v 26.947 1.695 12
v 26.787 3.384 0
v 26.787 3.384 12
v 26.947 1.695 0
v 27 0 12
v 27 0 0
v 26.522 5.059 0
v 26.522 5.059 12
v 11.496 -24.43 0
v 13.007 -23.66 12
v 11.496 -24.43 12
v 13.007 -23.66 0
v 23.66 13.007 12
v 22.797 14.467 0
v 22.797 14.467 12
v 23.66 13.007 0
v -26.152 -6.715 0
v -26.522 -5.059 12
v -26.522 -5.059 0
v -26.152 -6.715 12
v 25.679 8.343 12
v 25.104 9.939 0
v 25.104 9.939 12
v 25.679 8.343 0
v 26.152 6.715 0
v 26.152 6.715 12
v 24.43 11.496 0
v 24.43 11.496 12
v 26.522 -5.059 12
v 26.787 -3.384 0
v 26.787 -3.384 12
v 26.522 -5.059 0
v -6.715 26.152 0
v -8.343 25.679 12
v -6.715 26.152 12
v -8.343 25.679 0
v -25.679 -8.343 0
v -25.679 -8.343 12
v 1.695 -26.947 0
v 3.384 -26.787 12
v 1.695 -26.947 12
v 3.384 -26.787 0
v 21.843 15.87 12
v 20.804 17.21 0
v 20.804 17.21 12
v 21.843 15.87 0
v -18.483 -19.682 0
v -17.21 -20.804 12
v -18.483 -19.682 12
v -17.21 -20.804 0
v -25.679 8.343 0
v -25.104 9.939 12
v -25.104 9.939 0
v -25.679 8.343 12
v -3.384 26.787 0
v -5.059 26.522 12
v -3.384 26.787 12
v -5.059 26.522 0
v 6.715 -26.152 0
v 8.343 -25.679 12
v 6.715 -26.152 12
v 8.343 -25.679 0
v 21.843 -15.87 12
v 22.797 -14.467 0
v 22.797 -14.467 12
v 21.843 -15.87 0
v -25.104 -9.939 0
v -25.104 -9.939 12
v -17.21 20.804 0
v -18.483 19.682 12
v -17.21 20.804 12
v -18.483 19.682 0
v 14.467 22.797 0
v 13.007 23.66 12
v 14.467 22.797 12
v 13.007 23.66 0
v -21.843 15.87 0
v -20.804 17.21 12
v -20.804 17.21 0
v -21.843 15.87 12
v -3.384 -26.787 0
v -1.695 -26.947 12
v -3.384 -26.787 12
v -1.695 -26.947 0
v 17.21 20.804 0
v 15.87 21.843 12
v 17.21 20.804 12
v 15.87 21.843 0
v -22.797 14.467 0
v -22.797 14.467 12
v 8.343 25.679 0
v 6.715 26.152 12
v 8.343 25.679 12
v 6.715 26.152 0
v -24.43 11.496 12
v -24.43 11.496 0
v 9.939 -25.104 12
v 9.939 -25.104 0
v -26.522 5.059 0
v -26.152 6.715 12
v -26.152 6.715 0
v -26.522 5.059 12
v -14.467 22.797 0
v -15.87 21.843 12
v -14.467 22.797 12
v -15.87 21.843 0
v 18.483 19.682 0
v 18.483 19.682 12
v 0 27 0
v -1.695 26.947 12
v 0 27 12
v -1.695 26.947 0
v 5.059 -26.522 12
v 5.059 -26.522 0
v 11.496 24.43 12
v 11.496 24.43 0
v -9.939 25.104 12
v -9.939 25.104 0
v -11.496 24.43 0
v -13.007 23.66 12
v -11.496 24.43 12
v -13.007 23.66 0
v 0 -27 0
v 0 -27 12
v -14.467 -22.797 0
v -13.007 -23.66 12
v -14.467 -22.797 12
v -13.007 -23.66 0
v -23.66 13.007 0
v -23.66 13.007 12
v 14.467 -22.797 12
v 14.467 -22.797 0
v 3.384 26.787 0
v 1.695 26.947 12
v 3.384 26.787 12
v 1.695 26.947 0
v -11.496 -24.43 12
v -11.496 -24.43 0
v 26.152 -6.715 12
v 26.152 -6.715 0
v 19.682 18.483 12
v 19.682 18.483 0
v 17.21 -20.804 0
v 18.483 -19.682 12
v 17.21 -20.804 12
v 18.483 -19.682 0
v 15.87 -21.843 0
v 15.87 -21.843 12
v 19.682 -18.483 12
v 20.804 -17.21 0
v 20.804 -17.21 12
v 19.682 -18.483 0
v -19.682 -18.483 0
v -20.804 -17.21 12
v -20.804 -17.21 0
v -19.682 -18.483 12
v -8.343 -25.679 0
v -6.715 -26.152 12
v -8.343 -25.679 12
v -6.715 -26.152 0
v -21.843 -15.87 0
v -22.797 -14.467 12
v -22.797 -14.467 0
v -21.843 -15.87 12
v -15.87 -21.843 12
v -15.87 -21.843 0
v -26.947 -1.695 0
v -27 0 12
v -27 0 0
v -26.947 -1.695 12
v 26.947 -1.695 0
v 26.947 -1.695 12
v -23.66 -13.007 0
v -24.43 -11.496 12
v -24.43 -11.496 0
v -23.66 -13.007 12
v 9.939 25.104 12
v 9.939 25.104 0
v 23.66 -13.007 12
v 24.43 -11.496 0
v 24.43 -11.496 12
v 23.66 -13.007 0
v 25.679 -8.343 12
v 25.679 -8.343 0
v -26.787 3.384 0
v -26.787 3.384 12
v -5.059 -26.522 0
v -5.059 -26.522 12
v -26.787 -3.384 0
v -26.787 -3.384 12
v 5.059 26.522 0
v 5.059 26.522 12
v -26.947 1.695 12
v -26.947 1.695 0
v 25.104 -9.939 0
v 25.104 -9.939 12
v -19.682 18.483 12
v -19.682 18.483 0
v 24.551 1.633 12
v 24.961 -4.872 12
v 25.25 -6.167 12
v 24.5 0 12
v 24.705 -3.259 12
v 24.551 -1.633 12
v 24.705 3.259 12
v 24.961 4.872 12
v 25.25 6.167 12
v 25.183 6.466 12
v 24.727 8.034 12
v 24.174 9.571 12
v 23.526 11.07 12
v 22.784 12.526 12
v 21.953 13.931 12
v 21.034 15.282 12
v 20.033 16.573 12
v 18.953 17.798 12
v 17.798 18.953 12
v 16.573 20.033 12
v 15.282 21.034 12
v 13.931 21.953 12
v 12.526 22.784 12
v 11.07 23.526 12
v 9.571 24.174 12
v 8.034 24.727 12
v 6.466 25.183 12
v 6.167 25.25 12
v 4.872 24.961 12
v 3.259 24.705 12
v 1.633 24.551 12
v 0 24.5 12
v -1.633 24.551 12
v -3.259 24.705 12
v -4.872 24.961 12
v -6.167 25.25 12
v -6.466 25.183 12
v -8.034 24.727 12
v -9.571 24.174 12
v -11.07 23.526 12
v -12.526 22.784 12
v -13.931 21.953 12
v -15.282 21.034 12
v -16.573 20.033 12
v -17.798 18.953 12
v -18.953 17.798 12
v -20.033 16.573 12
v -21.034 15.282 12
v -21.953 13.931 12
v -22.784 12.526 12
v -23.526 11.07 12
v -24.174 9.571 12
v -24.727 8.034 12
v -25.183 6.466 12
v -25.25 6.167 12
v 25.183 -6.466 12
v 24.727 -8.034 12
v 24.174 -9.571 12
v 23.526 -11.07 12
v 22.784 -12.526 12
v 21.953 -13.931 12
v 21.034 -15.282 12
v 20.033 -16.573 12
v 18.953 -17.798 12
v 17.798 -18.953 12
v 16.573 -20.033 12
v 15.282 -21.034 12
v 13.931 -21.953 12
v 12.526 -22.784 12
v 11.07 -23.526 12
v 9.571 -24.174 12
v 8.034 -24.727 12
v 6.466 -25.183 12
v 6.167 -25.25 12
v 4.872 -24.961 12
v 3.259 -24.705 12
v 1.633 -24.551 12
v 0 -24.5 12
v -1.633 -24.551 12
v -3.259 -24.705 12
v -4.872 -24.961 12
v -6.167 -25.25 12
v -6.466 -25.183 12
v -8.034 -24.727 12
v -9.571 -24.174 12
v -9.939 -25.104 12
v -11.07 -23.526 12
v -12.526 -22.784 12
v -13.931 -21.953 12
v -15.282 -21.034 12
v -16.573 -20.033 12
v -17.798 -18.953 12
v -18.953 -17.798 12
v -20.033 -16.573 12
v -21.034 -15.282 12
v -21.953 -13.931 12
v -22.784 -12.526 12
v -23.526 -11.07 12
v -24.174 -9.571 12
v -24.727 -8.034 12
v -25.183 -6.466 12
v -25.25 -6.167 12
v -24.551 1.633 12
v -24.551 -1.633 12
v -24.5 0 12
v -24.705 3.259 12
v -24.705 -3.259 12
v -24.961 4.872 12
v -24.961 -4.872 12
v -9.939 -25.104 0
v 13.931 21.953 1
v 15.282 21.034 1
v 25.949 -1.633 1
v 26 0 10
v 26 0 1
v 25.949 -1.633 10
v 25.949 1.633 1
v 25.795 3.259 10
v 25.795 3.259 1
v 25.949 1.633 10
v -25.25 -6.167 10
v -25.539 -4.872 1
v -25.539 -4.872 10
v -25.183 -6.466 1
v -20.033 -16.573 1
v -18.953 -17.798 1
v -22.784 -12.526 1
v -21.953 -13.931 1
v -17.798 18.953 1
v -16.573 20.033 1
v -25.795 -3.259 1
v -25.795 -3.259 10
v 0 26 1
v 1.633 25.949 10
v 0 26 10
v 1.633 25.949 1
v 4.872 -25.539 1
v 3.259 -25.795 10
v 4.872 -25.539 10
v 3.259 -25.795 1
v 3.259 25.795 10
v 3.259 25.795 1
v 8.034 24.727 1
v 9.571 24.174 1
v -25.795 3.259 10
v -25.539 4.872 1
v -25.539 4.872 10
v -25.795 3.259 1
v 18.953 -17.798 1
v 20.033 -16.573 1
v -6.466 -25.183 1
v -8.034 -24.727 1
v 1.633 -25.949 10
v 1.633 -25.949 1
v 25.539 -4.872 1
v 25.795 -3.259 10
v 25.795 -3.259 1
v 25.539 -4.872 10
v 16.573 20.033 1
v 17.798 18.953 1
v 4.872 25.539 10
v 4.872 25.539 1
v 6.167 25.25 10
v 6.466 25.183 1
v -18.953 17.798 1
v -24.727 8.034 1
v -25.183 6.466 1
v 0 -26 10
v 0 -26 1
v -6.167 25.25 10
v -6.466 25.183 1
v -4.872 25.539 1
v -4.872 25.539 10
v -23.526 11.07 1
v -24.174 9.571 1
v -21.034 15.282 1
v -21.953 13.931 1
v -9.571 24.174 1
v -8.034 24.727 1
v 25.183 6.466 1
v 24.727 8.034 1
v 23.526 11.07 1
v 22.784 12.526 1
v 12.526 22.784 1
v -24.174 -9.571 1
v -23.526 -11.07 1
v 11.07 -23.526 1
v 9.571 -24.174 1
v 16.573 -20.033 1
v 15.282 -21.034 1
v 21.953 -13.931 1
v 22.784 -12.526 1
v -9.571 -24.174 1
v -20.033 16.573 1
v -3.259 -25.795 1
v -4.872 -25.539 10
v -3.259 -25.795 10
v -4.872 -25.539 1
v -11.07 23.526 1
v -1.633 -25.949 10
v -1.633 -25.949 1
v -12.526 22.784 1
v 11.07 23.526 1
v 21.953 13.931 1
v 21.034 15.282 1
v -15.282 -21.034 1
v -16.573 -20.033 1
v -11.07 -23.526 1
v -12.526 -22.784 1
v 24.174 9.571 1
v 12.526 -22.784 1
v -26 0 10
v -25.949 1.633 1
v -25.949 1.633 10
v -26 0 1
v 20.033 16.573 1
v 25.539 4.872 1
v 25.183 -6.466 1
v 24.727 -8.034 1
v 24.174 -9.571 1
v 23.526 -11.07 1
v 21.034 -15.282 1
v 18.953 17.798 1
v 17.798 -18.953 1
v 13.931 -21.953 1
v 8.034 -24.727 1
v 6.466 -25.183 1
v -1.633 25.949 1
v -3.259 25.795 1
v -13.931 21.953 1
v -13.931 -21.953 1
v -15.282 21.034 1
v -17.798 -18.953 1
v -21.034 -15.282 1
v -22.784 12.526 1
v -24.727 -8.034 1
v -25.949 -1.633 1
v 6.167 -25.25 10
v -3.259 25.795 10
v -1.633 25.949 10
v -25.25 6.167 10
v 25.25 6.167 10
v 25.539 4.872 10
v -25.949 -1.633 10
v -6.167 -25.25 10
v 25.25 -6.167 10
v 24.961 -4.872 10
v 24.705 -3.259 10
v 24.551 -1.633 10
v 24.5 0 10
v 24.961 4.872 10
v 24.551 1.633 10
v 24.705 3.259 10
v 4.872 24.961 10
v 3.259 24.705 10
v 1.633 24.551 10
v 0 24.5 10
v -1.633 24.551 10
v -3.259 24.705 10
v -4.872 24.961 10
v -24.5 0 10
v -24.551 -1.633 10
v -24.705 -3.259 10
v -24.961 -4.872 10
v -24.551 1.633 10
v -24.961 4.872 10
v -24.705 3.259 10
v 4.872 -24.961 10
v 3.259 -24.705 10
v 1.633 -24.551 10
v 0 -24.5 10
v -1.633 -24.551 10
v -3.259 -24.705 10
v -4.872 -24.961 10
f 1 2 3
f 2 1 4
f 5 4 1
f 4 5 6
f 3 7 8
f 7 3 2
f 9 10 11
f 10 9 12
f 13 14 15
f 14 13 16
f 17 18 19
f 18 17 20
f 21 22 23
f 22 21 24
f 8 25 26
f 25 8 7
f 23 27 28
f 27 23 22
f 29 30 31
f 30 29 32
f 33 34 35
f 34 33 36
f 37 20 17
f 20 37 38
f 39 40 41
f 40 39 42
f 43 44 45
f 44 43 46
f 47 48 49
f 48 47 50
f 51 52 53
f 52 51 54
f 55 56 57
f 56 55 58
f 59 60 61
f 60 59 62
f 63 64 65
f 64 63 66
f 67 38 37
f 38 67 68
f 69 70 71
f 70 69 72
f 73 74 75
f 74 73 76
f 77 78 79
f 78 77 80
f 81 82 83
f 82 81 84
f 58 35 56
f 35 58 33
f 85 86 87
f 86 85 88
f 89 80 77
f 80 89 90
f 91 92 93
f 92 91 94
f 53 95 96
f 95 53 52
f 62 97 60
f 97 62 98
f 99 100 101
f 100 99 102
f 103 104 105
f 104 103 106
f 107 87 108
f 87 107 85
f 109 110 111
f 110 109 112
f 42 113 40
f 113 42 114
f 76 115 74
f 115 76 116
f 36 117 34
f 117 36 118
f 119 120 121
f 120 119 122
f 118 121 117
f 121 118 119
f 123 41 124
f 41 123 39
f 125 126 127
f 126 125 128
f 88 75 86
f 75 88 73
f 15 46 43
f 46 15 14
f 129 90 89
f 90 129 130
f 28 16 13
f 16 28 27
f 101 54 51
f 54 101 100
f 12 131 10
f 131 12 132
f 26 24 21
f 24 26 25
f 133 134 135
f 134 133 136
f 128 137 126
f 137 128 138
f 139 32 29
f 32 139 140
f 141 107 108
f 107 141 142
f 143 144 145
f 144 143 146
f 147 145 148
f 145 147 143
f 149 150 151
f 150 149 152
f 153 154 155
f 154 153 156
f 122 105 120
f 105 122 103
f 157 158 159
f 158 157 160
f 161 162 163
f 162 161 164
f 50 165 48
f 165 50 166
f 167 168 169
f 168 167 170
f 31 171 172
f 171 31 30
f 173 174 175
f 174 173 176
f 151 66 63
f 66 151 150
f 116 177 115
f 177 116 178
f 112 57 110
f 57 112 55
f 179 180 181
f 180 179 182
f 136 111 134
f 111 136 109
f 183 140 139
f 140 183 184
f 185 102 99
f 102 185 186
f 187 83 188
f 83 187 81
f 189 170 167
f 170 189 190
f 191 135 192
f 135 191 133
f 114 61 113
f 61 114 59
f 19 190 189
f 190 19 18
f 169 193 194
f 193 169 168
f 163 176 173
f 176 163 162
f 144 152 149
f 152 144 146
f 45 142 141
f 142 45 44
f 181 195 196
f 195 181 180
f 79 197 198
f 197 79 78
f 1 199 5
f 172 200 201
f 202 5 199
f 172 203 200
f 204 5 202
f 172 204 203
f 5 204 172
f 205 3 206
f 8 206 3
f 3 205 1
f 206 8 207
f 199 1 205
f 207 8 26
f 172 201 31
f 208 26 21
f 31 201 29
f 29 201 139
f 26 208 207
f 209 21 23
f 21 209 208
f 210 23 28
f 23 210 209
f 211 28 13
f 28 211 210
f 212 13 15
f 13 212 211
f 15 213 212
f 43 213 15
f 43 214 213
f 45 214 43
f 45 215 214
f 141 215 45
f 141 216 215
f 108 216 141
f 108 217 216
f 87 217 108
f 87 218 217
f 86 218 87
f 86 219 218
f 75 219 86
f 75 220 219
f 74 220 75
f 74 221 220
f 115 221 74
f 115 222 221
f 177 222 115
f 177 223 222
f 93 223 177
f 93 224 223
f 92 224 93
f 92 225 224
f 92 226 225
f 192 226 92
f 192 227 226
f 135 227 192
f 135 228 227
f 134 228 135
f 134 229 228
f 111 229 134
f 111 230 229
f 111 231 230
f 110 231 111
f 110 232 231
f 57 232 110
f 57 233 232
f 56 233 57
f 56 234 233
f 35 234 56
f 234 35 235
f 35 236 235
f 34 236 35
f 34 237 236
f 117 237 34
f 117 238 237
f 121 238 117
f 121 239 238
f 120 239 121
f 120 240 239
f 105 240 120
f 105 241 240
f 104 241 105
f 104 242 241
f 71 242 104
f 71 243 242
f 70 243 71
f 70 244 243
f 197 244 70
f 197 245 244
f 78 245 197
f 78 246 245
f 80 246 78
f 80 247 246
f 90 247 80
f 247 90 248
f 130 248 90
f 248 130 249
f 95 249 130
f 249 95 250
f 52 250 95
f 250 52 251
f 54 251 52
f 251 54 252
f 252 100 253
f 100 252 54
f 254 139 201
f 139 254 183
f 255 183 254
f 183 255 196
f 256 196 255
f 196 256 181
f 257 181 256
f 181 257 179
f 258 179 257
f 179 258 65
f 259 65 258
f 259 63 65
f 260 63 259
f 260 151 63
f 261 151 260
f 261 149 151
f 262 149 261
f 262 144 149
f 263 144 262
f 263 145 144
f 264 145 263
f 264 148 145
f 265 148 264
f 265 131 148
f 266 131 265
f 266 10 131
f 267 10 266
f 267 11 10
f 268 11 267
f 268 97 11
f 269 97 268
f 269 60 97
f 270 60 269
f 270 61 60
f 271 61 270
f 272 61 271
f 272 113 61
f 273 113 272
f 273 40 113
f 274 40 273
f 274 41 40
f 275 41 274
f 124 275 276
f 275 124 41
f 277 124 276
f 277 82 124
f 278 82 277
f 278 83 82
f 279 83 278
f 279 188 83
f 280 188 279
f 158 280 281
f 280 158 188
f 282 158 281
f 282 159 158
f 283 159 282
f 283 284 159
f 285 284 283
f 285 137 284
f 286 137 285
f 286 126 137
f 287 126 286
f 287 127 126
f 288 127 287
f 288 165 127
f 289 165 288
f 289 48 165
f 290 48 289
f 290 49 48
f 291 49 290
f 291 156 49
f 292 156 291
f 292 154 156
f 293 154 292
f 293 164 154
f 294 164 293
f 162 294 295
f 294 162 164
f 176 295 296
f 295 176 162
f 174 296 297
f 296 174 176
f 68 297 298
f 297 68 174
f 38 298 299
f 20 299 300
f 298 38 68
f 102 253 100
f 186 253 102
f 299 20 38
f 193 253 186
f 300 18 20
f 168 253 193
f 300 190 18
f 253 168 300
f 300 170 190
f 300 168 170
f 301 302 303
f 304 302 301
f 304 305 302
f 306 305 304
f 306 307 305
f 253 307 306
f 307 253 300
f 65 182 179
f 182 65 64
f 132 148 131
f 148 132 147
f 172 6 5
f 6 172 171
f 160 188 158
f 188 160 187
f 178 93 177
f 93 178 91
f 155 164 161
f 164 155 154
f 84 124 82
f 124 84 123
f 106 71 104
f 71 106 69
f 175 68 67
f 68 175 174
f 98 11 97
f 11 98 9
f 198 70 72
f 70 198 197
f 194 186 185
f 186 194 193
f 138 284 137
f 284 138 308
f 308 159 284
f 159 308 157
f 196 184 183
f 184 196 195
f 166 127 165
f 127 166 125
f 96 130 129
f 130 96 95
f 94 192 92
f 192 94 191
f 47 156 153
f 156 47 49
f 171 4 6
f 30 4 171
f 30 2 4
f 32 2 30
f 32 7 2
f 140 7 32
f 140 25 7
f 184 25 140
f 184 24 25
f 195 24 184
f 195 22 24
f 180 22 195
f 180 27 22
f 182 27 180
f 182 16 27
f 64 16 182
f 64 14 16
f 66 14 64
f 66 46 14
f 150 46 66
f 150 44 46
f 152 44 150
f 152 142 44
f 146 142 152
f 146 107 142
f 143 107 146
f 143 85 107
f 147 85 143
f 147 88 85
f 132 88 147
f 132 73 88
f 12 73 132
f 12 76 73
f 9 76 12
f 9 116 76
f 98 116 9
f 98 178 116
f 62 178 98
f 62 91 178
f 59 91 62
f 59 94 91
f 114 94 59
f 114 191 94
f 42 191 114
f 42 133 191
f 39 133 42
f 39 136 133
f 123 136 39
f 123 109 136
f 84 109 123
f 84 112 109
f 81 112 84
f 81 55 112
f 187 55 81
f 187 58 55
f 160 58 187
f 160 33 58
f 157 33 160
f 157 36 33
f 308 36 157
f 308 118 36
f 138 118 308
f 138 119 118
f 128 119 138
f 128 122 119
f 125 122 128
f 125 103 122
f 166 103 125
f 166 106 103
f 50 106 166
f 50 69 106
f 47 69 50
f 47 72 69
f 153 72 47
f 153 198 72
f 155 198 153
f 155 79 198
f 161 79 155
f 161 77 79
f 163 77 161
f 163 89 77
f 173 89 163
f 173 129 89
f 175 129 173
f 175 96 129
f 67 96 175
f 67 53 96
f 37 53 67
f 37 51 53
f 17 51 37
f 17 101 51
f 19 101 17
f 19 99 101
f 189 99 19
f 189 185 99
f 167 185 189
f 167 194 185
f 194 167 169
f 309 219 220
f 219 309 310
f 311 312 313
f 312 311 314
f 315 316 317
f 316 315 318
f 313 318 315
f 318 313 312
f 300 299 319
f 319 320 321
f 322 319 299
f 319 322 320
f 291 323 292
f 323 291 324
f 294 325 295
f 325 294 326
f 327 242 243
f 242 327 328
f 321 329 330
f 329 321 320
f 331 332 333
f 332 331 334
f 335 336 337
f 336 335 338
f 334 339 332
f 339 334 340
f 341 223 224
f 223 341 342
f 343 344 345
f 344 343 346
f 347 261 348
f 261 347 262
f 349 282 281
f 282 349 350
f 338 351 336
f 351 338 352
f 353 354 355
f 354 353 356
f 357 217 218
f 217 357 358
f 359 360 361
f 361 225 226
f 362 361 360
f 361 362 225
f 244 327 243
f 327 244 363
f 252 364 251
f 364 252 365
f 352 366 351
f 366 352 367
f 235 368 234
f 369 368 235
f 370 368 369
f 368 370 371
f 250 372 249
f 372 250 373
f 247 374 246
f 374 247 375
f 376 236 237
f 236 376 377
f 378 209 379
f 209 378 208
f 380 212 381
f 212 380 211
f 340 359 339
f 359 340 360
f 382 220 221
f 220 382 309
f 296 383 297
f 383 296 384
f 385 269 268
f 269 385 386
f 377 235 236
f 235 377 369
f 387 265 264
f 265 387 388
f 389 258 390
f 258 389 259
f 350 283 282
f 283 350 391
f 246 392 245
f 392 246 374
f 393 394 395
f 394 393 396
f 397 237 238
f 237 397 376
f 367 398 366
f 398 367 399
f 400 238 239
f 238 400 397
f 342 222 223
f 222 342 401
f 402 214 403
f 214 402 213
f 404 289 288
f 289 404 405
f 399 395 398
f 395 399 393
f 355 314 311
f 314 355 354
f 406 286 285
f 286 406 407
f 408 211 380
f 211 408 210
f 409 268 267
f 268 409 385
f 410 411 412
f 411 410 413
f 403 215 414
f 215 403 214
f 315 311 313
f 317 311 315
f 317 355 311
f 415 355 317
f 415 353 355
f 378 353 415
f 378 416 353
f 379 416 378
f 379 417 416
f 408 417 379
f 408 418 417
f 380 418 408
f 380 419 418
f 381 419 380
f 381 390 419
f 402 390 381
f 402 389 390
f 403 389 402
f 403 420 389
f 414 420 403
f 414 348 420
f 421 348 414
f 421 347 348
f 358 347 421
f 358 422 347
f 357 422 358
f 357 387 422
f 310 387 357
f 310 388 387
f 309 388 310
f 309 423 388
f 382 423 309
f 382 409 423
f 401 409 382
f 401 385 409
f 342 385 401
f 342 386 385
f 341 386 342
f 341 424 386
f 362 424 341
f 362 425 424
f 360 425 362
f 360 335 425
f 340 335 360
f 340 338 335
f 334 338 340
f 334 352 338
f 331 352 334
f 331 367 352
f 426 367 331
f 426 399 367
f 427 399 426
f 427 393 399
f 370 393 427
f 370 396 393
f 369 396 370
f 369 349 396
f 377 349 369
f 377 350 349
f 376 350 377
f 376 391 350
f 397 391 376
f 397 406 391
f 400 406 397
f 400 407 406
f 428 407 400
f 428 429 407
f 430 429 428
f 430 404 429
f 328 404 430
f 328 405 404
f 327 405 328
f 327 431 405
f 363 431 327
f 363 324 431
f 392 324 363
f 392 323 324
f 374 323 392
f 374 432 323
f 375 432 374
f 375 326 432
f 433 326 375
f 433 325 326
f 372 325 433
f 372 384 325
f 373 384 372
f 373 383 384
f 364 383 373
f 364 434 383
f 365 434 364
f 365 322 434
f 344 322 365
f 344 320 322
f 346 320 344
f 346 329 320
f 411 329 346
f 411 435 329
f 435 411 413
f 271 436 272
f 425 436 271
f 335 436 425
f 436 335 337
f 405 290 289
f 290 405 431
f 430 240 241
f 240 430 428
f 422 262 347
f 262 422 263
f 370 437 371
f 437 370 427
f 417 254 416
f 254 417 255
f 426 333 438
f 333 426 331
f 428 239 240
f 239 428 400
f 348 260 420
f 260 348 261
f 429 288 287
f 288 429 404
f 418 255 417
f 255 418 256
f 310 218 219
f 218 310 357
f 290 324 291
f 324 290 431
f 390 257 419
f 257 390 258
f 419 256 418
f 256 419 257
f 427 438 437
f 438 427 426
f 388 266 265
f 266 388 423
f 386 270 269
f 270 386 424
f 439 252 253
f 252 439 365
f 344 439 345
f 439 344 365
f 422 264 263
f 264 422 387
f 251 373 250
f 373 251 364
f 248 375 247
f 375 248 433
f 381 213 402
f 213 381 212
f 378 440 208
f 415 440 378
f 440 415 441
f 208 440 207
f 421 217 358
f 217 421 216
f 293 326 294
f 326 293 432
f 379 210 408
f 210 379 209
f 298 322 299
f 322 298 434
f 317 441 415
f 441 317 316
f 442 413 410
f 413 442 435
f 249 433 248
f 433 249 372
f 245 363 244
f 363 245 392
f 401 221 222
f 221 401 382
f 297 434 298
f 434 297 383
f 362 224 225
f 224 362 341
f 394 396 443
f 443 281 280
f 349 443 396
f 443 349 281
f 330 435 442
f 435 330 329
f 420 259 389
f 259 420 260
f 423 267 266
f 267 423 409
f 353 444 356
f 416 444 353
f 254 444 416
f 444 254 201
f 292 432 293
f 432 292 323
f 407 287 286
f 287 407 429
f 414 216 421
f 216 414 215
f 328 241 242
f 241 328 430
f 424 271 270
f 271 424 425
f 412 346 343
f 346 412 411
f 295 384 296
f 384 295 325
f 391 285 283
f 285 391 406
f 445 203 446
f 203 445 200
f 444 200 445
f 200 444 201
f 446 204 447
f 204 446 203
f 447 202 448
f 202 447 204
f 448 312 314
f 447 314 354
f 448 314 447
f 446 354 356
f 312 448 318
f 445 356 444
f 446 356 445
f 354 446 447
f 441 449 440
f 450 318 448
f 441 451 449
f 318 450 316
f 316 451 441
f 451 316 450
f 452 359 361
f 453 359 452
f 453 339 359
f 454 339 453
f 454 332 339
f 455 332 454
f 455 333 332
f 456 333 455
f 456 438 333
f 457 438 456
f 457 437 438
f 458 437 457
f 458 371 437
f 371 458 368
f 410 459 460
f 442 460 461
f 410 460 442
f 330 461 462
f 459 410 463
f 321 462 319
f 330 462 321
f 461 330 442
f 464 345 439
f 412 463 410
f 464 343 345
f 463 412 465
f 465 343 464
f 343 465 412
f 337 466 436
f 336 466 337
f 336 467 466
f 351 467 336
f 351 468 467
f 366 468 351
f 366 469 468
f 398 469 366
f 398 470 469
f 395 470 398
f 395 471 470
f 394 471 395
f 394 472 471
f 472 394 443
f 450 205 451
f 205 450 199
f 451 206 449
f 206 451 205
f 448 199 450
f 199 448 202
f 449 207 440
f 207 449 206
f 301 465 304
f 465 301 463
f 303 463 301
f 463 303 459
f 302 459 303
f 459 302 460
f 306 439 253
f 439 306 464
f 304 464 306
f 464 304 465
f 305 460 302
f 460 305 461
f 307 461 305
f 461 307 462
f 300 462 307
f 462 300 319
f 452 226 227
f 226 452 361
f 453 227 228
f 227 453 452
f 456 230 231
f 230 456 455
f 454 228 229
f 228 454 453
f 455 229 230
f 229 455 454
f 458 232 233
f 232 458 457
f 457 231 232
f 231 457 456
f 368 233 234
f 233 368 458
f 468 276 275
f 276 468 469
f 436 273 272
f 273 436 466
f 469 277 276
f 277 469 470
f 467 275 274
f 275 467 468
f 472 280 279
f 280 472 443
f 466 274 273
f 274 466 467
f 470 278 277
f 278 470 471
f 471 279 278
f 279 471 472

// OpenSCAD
$fn = 100;

inner_diameter = 52;
inner_height = 11;
wall = 1;
thread_depth = 1.5;

difference() {
  cylinder(inner_height + wall, d=inner_diameter + wall * 2);
  translate([0, 0, wall])
    cylinder(inner_height, d=inner_diameter);
}

module circles() {
  translate([inner_diameter - thread_depth, 0, inner_height - 1])
    cylinder(wall * 2, d=inner_diameter);

  translate([-inner_diameter + thread_depth, 0, inner_height - 1])
    cylinder(wall * 2, d=inner_diameter);

  translate([0, inner_diameter - thread_depth, inner_height - 1])
    cylinder(wall * 2, d=inner_diameter);

  translate([0, -inner_diameter + thread_depth, inner_height - 1])
    cylinder(wall * 2, d=inner_diameter);

}

module threads() {
  intersection() {
    circles();

    translate([0, 0, inner_height - wall])
      cylinder(wall * 2, d=inner_diameter);
  }
}

threads();
